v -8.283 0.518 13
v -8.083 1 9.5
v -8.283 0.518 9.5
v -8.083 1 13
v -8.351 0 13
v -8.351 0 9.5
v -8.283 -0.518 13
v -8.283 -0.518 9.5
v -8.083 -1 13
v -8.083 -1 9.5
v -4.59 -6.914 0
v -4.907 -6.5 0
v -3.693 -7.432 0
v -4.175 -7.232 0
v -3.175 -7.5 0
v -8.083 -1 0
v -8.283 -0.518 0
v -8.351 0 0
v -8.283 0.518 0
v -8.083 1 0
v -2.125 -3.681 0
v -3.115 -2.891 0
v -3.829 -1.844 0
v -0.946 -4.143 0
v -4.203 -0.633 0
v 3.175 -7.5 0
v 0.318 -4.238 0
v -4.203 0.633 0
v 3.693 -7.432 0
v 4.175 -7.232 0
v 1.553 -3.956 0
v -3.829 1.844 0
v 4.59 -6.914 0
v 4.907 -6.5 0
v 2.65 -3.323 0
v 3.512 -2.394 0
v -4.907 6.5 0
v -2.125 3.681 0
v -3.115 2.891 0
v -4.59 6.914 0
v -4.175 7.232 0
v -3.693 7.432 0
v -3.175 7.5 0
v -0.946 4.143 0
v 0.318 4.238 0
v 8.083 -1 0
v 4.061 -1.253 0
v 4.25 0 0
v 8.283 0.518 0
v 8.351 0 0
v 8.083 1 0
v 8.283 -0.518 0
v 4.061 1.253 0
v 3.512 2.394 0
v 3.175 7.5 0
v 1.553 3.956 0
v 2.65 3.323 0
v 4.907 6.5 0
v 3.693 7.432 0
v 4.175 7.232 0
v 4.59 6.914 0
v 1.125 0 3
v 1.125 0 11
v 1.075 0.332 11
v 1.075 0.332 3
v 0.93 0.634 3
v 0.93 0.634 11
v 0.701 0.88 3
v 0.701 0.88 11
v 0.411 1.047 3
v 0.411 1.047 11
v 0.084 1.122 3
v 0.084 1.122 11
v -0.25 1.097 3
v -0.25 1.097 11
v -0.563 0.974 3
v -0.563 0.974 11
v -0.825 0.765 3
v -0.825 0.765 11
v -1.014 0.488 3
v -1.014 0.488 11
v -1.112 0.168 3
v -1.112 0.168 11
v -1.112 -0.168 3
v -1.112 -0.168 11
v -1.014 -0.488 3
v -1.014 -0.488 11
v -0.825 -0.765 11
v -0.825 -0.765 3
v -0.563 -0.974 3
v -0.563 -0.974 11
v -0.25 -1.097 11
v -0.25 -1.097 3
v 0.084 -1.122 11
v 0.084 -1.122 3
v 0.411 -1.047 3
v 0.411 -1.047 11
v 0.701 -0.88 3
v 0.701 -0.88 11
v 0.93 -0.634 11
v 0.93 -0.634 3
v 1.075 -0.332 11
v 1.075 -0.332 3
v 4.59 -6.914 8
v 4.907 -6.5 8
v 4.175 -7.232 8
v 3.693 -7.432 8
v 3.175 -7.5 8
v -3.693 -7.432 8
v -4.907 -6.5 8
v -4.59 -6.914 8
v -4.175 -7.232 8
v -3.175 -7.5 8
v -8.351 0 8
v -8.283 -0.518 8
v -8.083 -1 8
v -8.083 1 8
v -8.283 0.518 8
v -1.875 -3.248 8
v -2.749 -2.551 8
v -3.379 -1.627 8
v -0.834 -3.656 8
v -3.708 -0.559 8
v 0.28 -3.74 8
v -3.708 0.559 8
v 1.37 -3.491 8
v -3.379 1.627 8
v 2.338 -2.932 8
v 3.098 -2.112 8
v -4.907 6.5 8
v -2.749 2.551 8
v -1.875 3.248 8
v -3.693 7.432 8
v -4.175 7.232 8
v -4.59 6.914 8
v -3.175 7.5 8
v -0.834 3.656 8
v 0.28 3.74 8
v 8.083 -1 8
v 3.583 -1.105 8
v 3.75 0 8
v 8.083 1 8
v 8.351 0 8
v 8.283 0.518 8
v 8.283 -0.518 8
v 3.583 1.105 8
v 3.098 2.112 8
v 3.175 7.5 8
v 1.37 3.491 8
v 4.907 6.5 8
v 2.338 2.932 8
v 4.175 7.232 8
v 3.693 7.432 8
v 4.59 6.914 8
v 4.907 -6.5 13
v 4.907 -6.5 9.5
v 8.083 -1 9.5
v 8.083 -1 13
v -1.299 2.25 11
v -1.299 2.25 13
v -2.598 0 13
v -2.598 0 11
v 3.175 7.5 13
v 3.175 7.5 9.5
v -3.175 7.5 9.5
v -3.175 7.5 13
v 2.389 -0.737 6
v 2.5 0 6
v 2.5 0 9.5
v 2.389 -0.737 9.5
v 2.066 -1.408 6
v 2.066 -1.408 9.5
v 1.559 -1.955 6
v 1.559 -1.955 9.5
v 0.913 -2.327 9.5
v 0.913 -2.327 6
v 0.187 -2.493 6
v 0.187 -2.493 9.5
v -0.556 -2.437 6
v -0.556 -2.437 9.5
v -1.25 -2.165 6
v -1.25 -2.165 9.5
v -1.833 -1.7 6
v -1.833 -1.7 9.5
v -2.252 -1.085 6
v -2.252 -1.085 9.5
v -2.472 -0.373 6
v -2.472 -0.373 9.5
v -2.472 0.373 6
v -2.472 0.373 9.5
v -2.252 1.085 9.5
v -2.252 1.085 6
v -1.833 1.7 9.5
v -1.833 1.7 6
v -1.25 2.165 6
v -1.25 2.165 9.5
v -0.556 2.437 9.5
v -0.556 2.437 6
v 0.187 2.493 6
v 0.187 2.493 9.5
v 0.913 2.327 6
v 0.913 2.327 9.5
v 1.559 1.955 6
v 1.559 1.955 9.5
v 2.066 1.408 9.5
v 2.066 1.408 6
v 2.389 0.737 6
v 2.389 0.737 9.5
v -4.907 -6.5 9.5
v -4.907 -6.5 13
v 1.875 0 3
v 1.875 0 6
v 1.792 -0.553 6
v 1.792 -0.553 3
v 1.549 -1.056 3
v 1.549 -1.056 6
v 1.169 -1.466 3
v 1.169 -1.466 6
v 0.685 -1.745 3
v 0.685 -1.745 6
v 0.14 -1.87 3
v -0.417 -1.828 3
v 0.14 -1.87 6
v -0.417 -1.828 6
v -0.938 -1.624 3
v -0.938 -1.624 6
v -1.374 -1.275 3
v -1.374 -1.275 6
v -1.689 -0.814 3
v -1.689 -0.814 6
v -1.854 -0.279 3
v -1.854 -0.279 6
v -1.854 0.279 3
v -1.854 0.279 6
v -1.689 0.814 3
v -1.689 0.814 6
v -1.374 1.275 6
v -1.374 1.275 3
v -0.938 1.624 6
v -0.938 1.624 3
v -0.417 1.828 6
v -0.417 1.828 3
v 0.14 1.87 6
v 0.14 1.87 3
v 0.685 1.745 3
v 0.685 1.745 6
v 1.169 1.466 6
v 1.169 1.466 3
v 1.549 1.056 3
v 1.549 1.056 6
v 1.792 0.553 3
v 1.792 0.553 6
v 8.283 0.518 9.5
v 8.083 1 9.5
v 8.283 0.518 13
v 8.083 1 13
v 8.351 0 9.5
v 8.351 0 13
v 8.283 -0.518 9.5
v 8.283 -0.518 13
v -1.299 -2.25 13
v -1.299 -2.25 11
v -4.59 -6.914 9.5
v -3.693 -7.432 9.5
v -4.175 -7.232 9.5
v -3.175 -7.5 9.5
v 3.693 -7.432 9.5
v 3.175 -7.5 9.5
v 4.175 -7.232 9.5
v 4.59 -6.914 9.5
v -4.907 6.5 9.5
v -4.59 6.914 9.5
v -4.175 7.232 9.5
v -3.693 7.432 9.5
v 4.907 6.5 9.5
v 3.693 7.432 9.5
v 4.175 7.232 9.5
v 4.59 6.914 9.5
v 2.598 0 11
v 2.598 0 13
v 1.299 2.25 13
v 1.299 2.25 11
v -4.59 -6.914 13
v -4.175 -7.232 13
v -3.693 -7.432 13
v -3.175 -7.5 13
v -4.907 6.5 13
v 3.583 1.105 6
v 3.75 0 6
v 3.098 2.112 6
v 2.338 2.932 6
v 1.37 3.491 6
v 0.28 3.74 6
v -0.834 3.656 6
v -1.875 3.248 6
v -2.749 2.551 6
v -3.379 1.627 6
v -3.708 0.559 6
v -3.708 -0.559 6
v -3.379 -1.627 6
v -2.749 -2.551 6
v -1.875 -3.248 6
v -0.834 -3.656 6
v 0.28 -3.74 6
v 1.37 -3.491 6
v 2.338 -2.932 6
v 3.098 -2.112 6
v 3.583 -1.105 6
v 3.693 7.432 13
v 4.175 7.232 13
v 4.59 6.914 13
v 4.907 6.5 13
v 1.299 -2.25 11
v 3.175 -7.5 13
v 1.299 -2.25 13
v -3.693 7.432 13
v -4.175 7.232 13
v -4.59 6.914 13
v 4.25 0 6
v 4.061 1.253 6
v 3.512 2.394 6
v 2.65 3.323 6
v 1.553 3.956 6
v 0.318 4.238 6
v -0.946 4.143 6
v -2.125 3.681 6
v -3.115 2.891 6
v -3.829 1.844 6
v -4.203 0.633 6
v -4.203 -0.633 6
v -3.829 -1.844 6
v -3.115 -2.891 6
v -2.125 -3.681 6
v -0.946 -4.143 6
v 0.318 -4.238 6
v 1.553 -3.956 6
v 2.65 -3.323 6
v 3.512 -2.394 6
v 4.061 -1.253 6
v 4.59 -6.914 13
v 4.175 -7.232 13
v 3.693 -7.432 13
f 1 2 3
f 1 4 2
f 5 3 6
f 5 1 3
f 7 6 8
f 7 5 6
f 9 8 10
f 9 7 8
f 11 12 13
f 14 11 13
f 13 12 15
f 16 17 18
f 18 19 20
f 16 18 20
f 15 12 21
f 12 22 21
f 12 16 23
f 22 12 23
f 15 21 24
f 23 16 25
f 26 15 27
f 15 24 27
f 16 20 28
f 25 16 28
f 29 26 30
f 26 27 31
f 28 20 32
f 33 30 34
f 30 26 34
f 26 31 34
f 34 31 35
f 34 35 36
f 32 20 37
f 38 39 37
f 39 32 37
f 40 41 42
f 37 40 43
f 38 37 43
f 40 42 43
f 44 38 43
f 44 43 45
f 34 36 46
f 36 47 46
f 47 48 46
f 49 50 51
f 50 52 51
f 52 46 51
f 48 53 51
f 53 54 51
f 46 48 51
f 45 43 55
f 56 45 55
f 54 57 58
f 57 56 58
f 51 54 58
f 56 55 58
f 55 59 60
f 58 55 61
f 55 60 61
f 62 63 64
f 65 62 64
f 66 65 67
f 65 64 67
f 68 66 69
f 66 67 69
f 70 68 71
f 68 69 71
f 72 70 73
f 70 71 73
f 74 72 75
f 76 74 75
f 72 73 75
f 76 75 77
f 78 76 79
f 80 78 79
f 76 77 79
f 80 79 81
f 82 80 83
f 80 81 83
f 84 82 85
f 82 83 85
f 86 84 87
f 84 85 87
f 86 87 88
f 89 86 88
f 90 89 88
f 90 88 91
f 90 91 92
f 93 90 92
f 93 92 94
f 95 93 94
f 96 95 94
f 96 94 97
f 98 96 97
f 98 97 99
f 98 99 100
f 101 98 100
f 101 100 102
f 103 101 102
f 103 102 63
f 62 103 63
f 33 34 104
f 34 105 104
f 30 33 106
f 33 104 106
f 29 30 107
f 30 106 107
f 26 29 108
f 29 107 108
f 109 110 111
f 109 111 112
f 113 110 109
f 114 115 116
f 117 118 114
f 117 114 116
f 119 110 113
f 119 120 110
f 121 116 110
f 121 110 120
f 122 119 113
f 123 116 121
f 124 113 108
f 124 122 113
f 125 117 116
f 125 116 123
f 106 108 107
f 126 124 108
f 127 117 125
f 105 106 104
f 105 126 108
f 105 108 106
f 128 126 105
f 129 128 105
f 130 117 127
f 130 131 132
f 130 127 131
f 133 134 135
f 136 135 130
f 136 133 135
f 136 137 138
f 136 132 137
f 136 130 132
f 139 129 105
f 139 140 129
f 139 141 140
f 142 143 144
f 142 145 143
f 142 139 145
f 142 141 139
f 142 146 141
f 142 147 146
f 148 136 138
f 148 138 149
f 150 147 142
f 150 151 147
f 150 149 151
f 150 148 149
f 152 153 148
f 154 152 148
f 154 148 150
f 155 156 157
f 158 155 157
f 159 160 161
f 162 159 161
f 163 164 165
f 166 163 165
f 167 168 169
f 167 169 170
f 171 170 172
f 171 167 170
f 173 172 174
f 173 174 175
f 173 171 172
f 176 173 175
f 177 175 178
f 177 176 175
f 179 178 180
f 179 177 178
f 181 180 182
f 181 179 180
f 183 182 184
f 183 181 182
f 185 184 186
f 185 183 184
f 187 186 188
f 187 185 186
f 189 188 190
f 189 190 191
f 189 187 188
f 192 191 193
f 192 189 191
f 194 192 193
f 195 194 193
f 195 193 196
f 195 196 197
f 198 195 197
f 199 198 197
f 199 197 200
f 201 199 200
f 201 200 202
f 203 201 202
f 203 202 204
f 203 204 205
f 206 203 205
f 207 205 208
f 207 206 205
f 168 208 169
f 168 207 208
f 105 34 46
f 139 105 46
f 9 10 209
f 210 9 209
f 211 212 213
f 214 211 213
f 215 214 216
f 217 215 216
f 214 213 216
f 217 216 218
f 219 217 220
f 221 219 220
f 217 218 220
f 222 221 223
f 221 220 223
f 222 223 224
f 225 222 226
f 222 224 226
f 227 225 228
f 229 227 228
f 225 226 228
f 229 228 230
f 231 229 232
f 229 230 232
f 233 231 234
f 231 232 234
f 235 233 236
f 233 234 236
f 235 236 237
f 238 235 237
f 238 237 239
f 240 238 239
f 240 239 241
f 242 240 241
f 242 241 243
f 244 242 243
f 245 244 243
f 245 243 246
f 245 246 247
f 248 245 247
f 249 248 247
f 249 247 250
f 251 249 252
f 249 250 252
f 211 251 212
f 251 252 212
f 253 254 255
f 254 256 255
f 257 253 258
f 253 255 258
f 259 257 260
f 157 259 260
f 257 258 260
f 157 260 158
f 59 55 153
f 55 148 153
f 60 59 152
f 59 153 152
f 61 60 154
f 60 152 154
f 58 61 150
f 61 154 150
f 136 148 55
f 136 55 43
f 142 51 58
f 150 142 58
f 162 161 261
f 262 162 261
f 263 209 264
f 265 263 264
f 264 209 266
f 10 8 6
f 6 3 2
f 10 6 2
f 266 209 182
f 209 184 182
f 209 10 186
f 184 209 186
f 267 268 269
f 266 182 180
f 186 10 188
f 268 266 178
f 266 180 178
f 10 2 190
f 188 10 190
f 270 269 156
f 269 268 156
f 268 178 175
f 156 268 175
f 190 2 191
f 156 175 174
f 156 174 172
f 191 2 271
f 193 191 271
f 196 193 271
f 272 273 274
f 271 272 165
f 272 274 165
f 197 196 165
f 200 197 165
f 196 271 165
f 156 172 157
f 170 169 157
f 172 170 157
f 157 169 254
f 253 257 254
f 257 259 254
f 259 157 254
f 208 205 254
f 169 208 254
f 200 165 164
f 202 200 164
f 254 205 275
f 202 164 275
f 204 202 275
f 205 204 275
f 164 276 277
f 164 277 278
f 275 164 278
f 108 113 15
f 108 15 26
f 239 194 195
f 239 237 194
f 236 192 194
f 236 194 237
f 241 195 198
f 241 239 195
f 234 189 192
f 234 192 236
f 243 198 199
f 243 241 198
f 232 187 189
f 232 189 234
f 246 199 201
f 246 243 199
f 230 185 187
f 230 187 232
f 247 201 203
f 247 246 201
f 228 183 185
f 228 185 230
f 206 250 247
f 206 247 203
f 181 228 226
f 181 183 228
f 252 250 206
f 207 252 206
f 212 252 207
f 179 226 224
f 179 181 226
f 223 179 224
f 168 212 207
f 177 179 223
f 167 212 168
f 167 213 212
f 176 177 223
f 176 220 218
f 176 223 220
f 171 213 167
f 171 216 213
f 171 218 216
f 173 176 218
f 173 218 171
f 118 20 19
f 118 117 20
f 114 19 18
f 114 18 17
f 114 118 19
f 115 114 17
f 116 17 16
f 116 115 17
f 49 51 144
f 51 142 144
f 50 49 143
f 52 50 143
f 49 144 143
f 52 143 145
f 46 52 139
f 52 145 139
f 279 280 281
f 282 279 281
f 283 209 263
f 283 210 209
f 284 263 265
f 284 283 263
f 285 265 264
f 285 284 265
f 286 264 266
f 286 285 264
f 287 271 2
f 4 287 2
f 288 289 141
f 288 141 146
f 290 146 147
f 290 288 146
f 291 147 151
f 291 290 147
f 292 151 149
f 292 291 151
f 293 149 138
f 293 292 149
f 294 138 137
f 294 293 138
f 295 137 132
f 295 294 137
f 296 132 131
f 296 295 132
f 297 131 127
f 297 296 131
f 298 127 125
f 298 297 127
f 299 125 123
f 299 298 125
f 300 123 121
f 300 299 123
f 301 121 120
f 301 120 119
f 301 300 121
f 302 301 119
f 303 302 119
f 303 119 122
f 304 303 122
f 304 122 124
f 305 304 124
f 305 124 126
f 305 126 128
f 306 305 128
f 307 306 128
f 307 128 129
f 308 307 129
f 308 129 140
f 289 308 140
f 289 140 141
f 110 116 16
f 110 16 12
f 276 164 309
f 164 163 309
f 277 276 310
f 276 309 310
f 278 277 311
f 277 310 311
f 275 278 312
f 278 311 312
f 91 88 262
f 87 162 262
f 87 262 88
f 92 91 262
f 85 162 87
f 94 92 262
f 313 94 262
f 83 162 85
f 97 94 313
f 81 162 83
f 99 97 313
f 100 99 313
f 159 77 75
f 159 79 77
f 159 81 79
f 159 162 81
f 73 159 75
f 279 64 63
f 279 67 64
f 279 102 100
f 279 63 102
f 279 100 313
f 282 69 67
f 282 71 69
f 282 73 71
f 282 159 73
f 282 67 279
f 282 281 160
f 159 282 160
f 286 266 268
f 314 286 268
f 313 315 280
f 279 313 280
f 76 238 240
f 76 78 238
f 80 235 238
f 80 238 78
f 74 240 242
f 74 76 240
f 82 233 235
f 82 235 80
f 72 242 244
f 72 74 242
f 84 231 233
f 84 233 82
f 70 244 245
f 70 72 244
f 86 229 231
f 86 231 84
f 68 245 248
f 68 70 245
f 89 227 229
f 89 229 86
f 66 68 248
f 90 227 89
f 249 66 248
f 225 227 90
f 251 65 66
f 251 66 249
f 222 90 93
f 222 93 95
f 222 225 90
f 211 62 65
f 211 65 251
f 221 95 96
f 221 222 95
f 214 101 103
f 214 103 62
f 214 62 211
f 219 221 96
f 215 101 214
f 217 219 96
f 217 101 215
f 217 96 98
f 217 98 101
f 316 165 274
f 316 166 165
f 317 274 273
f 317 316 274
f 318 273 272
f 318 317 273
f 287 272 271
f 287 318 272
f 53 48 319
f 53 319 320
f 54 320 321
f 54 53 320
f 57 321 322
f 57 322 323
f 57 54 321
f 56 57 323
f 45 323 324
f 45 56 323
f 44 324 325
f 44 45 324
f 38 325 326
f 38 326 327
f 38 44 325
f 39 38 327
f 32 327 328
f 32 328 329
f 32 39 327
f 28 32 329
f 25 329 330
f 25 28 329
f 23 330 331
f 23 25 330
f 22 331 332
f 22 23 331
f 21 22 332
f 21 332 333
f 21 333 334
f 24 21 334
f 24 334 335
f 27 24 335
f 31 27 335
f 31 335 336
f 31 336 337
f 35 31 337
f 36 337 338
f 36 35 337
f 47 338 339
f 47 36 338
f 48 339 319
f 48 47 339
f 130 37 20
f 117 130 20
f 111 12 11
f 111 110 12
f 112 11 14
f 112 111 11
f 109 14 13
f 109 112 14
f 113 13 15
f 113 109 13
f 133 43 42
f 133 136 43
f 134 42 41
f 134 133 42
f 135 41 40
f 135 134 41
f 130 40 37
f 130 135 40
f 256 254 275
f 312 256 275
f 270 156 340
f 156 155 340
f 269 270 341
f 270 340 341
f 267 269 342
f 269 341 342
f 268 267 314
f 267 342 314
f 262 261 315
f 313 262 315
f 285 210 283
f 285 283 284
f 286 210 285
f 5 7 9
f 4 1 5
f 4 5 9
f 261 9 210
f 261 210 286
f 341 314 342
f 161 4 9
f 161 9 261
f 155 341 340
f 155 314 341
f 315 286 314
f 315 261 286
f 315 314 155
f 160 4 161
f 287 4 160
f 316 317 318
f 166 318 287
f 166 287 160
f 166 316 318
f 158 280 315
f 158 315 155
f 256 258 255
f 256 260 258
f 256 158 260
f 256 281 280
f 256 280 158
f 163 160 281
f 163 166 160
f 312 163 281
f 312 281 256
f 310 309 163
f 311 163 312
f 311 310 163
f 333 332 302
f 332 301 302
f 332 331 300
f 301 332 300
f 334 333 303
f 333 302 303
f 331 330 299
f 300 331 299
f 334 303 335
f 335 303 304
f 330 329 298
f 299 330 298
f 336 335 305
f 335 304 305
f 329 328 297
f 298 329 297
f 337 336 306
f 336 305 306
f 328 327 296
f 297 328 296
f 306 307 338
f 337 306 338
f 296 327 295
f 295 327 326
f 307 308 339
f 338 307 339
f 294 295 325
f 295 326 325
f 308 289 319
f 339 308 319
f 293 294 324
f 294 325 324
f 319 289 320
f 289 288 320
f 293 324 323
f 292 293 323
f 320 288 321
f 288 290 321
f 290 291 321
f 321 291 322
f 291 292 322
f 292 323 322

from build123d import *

# Parameters (mm, degrees)
F0_R      = 4.25
F0_R_2    = 3.75
F1_DEPTH  = 8
F2_DEPTH  = 6
F3_R      = 2.5
F4_DEPTH  = 3.5
F5_R      = 2.5
F6_DEPTH  = 3.5
F7_R      = 1.125
F8_DEPTH  = 2
F9_R      = 2
F9_2_R    = 2
F10_R     = 1.875
F11_DEPTH = 3
F12_DEPTH = 13.001


with BuildPart() as f1:
    # F0 (on Top) → F1 (new body)
    with BuildSketch(Plane.XY):
        Polygon((4.3301270189, 7.5), (-4.3301270189, 7.5), (-8.6602540378, 0), (-4.3301270189, -7.5), (4.3301270189, -7.5), (8.6602540378, 0), align=None)
        Circle(F0_R, mode=Mode.SUBTRACT)
        Circle(F0_R)
        Circle(F0_R_2, mode=Mode.SUBTRACT)
    extrude(amount=F1_DEPTH)

    # F0 (on Top) → F2 (cut)
    with BuildSketch(Plane.XY):
        Circle(F0_R)
        Circle(F0_R_2, mode=Mode.SUBTRACT)
    extrude(amount=F2_DEPTH, mode=Mode.SUBTRACT)

    # F9
    f9_edges = [f1.edges().sort_by_distance(p)[0] for p in [
        (-8.660254, 0, 4),
        (-4.330127, 7.5, 4),
        (-4.330127, -7.5, 4),
        (4.330127, -7.5, 4),
        (8.660254, 0, 4),
        (4.330127, 7.5, 4),
    ]]
    fillet(f9_edges, radius=F9_R)


with BuildPart() as f4:
    # F3 (on face) → F4 (new body)
    with BuildSketch(Plane(origin=(0, 0, 6), x_dir=(1, 0, 0), z_dir=(0, 0, -1))):
        Circle(F3_R)
    extrude(amount=-F4_DEPTH)

    # F5 (on face) → F6 (join)
    with BuildSketch(Plane.XY.offset(9.5)):
        Polygon((4.3301270189, 7.5), (-4.3301270189, 7.5), (-8.6602540378, 0), (-4.3301270189, -7.5), (4.3301270189, -7.5), (8.6602540378, 0), align=None)
        Circle(F5_R, mode=Mode.SUBTRACT)
        Circle(F5_R)
    extrude(amount=F6_DEPTH)

    # F7 (on face) → F8 (cut)
    with BuildSketch(Plane.XY.offset(13)):
        Polygon((1.2990381057, 2.25), (-1.2990381057, 2.25), (-2.5980762114, 0), (-1.2990381057, -2.25), (1.2990381057, -2.25), (2.5980762114, 0), align=None)
        Circle(F7_R, mode=Mode.SUBTRACT)
    extrude(amount=-F8_DEPTH, mode=Mode.SUBTRACT)

    # F9#2
    f9_2_edges = [f4.edges().sort_by_distance(p)[0] for p in [
        (-8.660254, 0, 11.25),
        (-4.330127, 7.5, 11.25),
        (-4.330127, -7.5, 11.25),
        (4.330127, 7.5, 11.25),
        (8.660254, 0, 11.25),
        (4.330127, -7.5, 11.25),
    ]]
    fillet(f9_2_edges, radius=F9_2_R)

    # F10 (on face) → F11 (join)
    with BuildSketch(Plane(origin=(0, 0, 6), x_dir=(1, 0, 0), z_dir=(0, 0, -1))):
        Circle(F10_R)
    extrude(amount=F11_DEPTH)

    # F7 (on face) → F12 (cut, through all)
    with BuildSketch(Plane.XY.offset(13)):
        Circle(F7_R)
    extrude(amount=-F12_DEPTH, mode=Mode.SUBTRACT)


solid = Compound([f1.part, f4.part])
